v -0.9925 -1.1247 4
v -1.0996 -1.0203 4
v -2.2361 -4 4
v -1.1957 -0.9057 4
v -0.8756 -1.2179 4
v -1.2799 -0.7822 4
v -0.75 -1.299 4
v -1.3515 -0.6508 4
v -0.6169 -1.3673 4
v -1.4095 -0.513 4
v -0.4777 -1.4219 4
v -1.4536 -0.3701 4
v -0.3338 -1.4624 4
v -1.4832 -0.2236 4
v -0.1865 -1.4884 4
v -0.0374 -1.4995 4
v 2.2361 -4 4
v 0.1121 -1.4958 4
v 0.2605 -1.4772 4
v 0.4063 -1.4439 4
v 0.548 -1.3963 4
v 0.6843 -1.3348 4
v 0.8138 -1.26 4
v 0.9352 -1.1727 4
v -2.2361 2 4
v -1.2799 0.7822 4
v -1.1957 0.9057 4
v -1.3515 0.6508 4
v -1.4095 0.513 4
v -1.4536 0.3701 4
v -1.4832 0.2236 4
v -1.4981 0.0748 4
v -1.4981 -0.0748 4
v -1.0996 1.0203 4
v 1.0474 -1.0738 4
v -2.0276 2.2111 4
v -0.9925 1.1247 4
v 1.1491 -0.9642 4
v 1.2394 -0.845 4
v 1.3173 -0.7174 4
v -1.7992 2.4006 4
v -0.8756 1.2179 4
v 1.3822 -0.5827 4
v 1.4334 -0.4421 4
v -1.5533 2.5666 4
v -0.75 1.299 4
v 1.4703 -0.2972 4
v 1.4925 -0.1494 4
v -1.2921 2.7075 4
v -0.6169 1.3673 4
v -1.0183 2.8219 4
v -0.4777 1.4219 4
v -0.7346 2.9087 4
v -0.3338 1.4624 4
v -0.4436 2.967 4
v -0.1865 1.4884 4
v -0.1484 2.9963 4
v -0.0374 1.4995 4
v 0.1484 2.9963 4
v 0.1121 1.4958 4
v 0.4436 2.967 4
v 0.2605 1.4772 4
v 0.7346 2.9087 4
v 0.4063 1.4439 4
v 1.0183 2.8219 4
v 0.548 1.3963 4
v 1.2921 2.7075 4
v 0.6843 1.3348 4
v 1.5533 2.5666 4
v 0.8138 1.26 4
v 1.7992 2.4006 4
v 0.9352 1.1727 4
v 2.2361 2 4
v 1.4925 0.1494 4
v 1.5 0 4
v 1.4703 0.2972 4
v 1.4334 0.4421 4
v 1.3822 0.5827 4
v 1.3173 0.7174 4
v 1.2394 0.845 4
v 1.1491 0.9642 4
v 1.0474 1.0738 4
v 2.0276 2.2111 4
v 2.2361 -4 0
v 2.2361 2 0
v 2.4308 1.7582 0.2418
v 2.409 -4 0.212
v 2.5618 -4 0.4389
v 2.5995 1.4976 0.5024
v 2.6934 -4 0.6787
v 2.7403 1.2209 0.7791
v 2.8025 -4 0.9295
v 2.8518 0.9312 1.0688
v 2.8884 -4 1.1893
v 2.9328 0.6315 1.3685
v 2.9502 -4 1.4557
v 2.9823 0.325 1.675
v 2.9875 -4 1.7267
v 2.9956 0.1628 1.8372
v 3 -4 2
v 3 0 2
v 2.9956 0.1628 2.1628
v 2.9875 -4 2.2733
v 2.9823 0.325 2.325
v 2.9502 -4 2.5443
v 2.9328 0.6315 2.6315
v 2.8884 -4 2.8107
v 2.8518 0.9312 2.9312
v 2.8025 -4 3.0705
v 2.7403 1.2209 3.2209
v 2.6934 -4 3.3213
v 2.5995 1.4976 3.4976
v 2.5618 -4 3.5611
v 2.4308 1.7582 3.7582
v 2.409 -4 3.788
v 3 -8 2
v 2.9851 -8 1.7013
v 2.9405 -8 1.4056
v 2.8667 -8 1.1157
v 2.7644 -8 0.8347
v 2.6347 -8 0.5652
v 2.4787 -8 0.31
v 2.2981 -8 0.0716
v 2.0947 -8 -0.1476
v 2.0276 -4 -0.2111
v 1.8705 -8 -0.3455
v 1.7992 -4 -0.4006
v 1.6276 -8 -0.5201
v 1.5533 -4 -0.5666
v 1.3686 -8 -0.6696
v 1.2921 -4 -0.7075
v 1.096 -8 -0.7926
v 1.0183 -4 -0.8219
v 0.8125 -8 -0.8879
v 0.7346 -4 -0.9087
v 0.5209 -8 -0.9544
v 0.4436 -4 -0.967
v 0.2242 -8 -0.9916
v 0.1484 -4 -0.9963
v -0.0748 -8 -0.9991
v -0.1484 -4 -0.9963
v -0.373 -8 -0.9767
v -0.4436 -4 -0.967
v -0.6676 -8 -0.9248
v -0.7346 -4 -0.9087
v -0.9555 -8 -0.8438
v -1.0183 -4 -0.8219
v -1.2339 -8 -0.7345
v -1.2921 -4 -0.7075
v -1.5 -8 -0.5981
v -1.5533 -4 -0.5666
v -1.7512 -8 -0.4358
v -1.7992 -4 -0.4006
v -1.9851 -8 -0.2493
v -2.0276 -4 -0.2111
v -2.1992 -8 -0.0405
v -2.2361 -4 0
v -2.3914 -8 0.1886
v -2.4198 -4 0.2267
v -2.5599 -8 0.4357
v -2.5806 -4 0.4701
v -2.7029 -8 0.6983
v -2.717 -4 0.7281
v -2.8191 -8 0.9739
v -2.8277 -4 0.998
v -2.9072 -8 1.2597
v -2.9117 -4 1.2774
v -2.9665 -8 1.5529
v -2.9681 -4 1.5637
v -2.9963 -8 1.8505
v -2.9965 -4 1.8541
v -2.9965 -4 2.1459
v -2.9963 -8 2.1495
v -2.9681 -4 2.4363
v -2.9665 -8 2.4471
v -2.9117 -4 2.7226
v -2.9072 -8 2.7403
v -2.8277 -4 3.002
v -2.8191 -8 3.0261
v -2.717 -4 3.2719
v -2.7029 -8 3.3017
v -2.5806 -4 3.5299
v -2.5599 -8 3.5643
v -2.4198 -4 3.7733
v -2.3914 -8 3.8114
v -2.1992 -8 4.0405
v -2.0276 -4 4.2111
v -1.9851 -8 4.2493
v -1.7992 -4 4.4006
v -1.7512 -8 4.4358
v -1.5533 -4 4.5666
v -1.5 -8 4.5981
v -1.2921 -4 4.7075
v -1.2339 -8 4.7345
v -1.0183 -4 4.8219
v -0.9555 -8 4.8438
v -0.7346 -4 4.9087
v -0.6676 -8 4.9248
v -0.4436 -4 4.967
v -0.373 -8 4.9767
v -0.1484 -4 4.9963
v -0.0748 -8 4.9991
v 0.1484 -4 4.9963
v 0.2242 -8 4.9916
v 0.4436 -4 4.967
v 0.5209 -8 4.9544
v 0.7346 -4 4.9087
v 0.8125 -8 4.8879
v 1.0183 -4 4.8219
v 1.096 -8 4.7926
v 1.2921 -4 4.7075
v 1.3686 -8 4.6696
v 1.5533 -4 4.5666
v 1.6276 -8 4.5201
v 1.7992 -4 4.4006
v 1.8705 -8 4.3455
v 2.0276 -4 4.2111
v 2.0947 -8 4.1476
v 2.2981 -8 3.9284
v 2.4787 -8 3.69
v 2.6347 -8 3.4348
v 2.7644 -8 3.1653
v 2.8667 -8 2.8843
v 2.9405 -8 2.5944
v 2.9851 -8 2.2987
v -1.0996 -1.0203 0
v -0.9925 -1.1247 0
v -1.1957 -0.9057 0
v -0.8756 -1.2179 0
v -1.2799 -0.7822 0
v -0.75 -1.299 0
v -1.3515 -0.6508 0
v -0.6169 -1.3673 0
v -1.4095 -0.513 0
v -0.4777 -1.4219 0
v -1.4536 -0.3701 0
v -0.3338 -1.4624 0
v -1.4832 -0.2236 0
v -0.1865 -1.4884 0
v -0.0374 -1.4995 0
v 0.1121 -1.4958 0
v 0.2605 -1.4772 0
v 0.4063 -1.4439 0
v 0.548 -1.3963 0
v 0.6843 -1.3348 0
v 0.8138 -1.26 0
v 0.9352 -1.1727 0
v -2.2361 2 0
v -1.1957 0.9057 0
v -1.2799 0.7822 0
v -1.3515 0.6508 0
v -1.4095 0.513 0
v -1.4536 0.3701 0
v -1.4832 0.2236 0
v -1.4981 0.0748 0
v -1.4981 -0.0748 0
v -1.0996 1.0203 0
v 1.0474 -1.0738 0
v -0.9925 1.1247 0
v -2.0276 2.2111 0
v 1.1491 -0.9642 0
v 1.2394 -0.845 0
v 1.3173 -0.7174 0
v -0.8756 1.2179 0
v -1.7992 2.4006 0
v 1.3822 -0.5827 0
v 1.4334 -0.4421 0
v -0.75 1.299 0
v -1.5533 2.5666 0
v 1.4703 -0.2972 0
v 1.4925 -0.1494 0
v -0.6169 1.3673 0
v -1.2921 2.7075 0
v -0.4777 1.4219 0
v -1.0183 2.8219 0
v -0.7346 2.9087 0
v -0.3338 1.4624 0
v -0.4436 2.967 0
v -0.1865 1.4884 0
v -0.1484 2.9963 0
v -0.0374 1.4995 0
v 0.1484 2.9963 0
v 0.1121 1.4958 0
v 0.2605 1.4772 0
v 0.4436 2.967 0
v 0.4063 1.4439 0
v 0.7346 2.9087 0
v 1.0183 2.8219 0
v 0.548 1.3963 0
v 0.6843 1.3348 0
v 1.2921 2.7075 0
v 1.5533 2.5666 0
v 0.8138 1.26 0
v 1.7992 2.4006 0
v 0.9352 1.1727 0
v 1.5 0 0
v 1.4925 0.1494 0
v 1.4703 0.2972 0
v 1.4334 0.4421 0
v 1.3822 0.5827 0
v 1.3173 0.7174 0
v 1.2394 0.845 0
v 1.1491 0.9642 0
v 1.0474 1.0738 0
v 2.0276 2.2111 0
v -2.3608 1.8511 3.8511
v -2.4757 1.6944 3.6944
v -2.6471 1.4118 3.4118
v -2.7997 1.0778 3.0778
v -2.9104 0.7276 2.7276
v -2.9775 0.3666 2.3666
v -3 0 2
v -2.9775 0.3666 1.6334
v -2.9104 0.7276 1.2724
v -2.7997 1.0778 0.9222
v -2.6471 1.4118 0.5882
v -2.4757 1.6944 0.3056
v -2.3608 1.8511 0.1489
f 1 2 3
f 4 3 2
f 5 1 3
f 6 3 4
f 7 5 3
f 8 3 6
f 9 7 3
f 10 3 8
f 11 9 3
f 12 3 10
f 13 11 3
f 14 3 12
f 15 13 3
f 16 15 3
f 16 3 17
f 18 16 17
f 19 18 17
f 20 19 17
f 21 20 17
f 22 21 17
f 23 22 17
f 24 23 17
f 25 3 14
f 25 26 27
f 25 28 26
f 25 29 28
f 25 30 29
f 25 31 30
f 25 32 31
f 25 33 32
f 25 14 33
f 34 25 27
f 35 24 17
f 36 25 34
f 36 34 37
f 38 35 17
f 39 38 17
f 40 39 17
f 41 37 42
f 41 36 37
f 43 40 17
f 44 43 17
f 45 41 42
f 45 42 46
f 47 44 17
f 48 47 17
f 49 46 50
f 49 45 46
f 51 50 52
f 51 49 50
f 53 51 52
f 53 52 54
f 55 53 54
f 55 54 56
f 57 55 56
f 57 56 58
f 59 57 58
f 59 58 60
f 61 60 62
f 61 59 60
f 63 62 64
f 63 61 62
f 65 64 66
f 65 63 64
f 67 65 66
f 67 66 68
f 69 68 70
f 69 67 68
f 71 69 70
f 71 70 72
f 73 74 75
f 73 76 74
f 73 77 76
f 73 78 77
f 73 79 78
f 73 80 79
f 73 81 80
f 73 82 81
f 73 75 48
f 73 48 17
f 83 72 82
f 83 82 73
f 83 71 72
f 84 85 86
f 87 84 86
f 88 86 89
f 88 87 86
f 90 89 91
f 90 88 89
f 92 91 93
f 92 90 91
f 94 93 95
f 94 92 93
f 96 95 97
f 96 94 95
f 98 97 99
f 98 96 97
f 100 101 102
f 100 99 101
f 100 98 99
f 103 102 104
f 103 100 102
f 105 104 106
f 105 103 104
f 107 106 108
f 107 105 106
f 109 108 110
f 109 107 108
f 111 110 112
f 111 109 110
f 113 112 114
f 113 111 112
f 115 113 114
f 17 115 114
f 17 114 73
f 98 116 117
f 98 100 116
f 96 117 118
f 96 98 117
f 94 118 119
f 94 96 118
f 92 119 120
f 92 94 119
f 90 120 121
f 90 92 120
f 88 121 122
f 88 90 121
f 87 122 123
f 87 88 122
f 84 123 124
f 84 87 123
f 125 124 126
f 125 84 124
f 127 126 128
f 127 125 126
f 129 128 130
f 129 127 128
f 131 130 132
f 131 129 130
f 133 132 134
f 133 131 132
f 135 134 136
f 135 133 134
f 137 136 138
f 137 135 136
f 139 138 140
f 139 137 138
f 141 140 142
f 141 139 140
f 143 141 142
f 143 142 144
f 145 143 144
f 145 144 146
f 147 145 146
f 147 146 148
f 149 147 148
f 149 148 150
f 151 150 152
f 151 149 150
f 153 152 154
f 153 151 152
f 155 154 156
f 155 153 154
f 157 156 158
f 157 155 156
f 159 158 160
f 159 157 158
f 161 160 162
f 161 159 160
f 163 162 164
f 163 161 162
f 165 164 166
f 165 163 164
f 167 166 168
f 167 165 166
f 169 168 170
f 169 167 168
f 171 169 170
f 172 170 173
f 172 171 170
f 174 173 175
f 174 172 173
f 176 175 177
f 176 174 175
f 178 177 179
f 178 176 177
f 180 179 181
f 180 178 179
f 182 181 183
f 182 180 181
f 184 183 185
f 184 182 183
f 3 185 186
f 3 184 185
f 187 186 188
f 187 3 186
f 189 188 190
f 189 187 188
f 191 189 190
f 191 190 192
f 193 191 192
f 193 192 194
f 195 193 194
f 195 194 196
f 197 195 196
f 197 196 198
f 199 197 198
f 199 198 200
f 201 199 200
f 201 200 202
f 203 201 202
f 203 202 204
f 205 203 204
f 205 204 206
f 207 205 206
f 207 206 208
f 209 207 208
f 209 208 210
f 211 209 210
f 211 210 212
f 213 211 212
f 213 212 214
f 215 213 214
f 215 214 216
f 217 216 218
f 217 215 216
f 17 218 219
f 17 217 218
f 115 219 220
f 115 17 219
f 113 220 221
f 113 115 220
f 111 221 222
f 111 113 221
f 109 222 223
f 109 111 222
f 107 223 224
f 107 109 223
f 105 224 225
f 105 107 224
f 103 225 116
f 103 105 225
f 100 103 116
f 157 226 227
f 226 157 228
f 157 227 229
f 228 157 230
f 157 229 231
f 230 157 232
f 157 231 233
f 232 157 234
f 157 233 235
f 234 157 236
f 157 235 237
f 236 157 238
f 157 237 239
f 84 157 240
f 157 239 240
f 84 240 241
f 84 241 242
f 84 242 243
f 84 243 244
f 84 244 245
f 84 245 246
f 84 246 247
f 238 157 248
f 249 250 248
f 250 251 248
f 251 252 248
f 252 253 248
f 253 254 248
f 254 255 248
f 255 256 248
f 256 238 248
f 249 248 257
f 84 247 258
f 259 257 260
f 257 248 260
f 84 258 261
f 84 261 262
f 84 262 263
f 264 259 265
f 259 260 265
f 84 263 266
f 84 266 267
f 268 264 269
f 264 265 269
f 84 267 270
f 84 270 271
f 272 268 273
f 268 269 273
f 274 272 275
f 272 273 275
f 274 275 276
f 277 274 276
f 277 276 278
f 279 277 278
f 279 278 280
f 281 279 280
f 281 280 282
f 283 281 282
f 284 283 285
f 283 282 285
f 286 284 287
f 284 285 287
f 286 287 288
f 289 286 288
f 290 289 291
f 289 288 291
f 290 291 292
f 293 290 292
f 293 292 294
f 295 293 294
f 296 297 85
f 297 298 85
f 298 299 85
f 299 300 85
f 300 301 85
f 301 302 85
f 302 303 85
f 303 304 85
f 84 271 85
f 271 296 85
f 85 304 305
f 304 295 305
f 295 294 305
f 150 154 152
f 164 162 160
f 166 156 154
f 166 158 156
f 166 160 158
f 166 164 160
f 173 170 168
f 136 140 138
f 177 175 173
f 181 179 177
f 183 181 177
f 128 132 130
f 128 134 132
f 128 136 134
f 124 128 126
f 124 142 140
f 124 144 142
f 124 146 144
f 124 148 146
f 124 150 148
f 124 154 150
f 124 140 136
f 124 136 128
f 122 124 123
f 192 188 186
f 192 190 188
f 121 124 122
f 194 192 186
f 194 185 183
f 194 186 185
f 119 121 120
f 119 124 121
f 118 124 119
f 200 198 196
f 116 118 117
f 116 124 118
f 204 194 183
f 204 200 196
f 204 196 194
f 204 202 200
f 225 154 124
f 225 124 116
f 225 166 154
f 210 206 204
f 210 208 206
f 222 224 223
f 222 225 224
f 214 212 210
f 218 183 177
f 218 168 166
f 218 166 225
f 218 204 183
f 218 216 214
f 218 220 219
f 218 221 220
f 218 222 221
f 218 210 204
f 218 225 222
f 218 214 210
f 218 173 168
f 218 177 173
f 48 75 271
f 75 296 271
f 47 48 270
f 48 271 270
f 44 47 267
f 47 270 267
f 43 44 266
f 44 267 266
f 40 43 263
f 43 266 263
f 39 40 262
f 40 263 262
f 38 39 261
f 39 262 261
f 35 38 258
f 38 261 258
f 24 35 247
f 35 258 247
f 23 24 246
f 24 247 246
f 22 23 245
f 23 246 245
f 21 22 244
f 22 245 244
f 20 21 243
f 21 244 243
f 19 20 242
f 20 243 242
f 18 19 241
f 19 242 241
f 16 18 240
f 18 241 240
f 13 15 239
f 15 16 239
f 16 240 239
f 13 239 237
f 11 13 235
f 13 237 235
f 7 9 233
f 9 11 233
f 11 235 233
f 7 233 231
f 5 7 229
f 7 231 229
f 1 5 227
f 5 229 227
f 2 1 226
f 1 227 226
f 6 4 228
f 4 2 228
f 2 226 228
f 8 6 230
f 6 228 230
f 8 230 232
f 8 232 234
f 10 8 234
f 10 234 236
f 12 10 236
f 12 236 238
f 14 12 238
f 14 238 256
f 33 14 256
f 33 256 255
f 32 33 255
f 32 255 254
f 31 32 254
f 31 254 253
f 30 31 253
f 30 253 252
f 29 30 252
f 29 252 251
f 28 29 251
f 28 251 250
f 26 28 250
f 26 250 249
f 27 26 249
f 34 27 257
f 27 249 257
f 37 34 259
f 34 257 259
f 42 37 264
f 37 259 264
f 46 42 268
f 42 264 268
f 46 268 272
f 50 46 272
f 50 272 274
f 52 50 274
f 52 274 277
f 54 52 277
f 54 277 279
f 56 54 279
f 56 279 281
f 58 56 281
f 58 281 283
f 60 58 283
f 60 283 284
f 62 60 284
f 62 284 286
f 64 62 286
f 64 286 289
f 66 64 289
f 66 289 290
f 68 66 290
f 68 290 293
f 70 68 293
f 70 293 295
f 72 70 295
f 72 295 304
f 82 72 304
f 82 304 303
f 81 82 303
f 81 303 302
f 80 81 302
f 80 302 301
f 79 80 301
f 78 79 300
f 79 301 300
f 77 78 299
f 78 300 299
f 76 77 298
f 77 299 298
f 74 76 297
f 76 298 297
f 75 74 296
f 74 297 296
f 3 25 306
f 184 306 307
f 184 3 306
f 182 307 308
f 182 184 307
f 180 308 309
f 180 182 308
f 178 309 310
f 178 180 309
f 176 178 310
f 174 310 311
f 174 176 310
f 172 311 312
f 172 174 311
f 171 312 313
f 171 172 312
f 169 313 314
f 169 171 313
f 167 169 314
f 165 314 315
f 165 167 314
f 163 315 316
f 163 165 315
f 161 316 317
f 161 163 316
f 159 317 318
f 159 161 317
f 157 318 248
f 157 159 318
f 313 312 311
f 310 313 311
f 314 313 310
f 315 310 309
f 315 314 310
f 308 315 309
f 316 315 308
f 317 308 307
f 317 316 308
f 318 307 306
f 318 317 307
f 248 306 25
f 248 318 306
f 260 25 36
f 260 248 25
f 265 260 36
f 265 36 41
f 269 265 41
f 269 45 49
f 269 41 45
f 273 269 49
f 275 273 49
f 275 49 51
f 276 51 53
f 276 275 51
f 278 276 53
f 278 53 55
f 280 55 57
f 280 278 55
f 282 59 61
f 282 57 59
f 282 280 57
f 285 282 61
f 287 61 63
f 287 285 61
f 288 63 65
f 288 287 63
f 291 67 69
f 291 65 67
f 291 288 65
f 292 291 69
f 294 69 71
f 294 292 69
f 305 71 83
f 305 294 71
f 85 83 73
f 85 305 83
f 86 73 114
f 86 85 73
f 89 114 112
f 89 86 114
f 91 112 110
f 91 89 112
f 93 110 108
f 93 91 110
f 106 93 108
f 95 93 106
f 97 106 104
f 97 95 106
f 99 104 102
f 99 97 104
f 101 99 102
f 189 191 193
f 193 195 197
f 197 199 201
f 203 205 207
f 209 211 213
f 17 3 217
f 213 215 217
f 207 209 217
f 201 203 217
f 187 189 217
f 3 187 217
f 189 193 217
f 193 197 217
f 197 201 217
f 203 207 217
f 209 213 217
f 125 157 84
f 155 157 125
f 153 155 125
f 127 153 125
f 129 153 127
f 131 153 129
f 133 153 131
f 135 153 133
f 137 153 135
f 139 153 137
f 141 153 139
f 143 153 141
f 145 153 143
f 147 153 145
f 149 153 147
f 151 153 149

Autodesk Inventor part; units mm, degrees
ref_plane "YZ Plane" through (0, 0, 0) normal (1, 0, 0) x (0, 1, 0)
ref_plane "XZ Plane" through (0, 0, 0) normal (0, 1, 0) x (-1, 0, 0)
ref_plane "XY Plane" through (0, 0, 0) normal (0, 0, 1) x (1, 0, 0)
sketch "スケッチ3" plane through (0, 0, 0) normal (0, 0, 1) x (1, 0, 0)
  circle A0 centre (0, 0) radius 1.5
  circle A1 centre (0, 0) radius 3
  line L0 (3, 0) -> (3, -4)
  line L1 (3, -4) -> (-3, -4)
  line L2 (-3, -4) -> (-3, 0)
  dimension "d9" = 6
  dimension "d8" = 3
  dimension "d10" = 4
extrude "押し出し3" add sketch "スケッチ3" along normal blind 4
sketch "スケッチ4" plane through (-3, -4, 0) normal (0, -1, 0) x (1, 0, 0)
  line L0 (6, 4) -> (0, 4) projected
  line L1 (6, 0) -> (6, 4) projected
  circle A0 centre (3, 2) radius 3
  line L2 (0, 0) -> (0, 4) projected
  line L3 (4.0287, 2) -> (1.8756, 2)
  point P0 (3, 0)
  point P1 (6, 2)
extrude "押し出し4" cut sketch "スケッチ4" against normal blind 10 contours A0 L0 | L0 A0 keep common part
extrude "押し出し5" add sketch "スケッチ4" along normal blind 4 contours A0 L0 | L0 A0
properties part number "頭" material "ABS プラスチック"
